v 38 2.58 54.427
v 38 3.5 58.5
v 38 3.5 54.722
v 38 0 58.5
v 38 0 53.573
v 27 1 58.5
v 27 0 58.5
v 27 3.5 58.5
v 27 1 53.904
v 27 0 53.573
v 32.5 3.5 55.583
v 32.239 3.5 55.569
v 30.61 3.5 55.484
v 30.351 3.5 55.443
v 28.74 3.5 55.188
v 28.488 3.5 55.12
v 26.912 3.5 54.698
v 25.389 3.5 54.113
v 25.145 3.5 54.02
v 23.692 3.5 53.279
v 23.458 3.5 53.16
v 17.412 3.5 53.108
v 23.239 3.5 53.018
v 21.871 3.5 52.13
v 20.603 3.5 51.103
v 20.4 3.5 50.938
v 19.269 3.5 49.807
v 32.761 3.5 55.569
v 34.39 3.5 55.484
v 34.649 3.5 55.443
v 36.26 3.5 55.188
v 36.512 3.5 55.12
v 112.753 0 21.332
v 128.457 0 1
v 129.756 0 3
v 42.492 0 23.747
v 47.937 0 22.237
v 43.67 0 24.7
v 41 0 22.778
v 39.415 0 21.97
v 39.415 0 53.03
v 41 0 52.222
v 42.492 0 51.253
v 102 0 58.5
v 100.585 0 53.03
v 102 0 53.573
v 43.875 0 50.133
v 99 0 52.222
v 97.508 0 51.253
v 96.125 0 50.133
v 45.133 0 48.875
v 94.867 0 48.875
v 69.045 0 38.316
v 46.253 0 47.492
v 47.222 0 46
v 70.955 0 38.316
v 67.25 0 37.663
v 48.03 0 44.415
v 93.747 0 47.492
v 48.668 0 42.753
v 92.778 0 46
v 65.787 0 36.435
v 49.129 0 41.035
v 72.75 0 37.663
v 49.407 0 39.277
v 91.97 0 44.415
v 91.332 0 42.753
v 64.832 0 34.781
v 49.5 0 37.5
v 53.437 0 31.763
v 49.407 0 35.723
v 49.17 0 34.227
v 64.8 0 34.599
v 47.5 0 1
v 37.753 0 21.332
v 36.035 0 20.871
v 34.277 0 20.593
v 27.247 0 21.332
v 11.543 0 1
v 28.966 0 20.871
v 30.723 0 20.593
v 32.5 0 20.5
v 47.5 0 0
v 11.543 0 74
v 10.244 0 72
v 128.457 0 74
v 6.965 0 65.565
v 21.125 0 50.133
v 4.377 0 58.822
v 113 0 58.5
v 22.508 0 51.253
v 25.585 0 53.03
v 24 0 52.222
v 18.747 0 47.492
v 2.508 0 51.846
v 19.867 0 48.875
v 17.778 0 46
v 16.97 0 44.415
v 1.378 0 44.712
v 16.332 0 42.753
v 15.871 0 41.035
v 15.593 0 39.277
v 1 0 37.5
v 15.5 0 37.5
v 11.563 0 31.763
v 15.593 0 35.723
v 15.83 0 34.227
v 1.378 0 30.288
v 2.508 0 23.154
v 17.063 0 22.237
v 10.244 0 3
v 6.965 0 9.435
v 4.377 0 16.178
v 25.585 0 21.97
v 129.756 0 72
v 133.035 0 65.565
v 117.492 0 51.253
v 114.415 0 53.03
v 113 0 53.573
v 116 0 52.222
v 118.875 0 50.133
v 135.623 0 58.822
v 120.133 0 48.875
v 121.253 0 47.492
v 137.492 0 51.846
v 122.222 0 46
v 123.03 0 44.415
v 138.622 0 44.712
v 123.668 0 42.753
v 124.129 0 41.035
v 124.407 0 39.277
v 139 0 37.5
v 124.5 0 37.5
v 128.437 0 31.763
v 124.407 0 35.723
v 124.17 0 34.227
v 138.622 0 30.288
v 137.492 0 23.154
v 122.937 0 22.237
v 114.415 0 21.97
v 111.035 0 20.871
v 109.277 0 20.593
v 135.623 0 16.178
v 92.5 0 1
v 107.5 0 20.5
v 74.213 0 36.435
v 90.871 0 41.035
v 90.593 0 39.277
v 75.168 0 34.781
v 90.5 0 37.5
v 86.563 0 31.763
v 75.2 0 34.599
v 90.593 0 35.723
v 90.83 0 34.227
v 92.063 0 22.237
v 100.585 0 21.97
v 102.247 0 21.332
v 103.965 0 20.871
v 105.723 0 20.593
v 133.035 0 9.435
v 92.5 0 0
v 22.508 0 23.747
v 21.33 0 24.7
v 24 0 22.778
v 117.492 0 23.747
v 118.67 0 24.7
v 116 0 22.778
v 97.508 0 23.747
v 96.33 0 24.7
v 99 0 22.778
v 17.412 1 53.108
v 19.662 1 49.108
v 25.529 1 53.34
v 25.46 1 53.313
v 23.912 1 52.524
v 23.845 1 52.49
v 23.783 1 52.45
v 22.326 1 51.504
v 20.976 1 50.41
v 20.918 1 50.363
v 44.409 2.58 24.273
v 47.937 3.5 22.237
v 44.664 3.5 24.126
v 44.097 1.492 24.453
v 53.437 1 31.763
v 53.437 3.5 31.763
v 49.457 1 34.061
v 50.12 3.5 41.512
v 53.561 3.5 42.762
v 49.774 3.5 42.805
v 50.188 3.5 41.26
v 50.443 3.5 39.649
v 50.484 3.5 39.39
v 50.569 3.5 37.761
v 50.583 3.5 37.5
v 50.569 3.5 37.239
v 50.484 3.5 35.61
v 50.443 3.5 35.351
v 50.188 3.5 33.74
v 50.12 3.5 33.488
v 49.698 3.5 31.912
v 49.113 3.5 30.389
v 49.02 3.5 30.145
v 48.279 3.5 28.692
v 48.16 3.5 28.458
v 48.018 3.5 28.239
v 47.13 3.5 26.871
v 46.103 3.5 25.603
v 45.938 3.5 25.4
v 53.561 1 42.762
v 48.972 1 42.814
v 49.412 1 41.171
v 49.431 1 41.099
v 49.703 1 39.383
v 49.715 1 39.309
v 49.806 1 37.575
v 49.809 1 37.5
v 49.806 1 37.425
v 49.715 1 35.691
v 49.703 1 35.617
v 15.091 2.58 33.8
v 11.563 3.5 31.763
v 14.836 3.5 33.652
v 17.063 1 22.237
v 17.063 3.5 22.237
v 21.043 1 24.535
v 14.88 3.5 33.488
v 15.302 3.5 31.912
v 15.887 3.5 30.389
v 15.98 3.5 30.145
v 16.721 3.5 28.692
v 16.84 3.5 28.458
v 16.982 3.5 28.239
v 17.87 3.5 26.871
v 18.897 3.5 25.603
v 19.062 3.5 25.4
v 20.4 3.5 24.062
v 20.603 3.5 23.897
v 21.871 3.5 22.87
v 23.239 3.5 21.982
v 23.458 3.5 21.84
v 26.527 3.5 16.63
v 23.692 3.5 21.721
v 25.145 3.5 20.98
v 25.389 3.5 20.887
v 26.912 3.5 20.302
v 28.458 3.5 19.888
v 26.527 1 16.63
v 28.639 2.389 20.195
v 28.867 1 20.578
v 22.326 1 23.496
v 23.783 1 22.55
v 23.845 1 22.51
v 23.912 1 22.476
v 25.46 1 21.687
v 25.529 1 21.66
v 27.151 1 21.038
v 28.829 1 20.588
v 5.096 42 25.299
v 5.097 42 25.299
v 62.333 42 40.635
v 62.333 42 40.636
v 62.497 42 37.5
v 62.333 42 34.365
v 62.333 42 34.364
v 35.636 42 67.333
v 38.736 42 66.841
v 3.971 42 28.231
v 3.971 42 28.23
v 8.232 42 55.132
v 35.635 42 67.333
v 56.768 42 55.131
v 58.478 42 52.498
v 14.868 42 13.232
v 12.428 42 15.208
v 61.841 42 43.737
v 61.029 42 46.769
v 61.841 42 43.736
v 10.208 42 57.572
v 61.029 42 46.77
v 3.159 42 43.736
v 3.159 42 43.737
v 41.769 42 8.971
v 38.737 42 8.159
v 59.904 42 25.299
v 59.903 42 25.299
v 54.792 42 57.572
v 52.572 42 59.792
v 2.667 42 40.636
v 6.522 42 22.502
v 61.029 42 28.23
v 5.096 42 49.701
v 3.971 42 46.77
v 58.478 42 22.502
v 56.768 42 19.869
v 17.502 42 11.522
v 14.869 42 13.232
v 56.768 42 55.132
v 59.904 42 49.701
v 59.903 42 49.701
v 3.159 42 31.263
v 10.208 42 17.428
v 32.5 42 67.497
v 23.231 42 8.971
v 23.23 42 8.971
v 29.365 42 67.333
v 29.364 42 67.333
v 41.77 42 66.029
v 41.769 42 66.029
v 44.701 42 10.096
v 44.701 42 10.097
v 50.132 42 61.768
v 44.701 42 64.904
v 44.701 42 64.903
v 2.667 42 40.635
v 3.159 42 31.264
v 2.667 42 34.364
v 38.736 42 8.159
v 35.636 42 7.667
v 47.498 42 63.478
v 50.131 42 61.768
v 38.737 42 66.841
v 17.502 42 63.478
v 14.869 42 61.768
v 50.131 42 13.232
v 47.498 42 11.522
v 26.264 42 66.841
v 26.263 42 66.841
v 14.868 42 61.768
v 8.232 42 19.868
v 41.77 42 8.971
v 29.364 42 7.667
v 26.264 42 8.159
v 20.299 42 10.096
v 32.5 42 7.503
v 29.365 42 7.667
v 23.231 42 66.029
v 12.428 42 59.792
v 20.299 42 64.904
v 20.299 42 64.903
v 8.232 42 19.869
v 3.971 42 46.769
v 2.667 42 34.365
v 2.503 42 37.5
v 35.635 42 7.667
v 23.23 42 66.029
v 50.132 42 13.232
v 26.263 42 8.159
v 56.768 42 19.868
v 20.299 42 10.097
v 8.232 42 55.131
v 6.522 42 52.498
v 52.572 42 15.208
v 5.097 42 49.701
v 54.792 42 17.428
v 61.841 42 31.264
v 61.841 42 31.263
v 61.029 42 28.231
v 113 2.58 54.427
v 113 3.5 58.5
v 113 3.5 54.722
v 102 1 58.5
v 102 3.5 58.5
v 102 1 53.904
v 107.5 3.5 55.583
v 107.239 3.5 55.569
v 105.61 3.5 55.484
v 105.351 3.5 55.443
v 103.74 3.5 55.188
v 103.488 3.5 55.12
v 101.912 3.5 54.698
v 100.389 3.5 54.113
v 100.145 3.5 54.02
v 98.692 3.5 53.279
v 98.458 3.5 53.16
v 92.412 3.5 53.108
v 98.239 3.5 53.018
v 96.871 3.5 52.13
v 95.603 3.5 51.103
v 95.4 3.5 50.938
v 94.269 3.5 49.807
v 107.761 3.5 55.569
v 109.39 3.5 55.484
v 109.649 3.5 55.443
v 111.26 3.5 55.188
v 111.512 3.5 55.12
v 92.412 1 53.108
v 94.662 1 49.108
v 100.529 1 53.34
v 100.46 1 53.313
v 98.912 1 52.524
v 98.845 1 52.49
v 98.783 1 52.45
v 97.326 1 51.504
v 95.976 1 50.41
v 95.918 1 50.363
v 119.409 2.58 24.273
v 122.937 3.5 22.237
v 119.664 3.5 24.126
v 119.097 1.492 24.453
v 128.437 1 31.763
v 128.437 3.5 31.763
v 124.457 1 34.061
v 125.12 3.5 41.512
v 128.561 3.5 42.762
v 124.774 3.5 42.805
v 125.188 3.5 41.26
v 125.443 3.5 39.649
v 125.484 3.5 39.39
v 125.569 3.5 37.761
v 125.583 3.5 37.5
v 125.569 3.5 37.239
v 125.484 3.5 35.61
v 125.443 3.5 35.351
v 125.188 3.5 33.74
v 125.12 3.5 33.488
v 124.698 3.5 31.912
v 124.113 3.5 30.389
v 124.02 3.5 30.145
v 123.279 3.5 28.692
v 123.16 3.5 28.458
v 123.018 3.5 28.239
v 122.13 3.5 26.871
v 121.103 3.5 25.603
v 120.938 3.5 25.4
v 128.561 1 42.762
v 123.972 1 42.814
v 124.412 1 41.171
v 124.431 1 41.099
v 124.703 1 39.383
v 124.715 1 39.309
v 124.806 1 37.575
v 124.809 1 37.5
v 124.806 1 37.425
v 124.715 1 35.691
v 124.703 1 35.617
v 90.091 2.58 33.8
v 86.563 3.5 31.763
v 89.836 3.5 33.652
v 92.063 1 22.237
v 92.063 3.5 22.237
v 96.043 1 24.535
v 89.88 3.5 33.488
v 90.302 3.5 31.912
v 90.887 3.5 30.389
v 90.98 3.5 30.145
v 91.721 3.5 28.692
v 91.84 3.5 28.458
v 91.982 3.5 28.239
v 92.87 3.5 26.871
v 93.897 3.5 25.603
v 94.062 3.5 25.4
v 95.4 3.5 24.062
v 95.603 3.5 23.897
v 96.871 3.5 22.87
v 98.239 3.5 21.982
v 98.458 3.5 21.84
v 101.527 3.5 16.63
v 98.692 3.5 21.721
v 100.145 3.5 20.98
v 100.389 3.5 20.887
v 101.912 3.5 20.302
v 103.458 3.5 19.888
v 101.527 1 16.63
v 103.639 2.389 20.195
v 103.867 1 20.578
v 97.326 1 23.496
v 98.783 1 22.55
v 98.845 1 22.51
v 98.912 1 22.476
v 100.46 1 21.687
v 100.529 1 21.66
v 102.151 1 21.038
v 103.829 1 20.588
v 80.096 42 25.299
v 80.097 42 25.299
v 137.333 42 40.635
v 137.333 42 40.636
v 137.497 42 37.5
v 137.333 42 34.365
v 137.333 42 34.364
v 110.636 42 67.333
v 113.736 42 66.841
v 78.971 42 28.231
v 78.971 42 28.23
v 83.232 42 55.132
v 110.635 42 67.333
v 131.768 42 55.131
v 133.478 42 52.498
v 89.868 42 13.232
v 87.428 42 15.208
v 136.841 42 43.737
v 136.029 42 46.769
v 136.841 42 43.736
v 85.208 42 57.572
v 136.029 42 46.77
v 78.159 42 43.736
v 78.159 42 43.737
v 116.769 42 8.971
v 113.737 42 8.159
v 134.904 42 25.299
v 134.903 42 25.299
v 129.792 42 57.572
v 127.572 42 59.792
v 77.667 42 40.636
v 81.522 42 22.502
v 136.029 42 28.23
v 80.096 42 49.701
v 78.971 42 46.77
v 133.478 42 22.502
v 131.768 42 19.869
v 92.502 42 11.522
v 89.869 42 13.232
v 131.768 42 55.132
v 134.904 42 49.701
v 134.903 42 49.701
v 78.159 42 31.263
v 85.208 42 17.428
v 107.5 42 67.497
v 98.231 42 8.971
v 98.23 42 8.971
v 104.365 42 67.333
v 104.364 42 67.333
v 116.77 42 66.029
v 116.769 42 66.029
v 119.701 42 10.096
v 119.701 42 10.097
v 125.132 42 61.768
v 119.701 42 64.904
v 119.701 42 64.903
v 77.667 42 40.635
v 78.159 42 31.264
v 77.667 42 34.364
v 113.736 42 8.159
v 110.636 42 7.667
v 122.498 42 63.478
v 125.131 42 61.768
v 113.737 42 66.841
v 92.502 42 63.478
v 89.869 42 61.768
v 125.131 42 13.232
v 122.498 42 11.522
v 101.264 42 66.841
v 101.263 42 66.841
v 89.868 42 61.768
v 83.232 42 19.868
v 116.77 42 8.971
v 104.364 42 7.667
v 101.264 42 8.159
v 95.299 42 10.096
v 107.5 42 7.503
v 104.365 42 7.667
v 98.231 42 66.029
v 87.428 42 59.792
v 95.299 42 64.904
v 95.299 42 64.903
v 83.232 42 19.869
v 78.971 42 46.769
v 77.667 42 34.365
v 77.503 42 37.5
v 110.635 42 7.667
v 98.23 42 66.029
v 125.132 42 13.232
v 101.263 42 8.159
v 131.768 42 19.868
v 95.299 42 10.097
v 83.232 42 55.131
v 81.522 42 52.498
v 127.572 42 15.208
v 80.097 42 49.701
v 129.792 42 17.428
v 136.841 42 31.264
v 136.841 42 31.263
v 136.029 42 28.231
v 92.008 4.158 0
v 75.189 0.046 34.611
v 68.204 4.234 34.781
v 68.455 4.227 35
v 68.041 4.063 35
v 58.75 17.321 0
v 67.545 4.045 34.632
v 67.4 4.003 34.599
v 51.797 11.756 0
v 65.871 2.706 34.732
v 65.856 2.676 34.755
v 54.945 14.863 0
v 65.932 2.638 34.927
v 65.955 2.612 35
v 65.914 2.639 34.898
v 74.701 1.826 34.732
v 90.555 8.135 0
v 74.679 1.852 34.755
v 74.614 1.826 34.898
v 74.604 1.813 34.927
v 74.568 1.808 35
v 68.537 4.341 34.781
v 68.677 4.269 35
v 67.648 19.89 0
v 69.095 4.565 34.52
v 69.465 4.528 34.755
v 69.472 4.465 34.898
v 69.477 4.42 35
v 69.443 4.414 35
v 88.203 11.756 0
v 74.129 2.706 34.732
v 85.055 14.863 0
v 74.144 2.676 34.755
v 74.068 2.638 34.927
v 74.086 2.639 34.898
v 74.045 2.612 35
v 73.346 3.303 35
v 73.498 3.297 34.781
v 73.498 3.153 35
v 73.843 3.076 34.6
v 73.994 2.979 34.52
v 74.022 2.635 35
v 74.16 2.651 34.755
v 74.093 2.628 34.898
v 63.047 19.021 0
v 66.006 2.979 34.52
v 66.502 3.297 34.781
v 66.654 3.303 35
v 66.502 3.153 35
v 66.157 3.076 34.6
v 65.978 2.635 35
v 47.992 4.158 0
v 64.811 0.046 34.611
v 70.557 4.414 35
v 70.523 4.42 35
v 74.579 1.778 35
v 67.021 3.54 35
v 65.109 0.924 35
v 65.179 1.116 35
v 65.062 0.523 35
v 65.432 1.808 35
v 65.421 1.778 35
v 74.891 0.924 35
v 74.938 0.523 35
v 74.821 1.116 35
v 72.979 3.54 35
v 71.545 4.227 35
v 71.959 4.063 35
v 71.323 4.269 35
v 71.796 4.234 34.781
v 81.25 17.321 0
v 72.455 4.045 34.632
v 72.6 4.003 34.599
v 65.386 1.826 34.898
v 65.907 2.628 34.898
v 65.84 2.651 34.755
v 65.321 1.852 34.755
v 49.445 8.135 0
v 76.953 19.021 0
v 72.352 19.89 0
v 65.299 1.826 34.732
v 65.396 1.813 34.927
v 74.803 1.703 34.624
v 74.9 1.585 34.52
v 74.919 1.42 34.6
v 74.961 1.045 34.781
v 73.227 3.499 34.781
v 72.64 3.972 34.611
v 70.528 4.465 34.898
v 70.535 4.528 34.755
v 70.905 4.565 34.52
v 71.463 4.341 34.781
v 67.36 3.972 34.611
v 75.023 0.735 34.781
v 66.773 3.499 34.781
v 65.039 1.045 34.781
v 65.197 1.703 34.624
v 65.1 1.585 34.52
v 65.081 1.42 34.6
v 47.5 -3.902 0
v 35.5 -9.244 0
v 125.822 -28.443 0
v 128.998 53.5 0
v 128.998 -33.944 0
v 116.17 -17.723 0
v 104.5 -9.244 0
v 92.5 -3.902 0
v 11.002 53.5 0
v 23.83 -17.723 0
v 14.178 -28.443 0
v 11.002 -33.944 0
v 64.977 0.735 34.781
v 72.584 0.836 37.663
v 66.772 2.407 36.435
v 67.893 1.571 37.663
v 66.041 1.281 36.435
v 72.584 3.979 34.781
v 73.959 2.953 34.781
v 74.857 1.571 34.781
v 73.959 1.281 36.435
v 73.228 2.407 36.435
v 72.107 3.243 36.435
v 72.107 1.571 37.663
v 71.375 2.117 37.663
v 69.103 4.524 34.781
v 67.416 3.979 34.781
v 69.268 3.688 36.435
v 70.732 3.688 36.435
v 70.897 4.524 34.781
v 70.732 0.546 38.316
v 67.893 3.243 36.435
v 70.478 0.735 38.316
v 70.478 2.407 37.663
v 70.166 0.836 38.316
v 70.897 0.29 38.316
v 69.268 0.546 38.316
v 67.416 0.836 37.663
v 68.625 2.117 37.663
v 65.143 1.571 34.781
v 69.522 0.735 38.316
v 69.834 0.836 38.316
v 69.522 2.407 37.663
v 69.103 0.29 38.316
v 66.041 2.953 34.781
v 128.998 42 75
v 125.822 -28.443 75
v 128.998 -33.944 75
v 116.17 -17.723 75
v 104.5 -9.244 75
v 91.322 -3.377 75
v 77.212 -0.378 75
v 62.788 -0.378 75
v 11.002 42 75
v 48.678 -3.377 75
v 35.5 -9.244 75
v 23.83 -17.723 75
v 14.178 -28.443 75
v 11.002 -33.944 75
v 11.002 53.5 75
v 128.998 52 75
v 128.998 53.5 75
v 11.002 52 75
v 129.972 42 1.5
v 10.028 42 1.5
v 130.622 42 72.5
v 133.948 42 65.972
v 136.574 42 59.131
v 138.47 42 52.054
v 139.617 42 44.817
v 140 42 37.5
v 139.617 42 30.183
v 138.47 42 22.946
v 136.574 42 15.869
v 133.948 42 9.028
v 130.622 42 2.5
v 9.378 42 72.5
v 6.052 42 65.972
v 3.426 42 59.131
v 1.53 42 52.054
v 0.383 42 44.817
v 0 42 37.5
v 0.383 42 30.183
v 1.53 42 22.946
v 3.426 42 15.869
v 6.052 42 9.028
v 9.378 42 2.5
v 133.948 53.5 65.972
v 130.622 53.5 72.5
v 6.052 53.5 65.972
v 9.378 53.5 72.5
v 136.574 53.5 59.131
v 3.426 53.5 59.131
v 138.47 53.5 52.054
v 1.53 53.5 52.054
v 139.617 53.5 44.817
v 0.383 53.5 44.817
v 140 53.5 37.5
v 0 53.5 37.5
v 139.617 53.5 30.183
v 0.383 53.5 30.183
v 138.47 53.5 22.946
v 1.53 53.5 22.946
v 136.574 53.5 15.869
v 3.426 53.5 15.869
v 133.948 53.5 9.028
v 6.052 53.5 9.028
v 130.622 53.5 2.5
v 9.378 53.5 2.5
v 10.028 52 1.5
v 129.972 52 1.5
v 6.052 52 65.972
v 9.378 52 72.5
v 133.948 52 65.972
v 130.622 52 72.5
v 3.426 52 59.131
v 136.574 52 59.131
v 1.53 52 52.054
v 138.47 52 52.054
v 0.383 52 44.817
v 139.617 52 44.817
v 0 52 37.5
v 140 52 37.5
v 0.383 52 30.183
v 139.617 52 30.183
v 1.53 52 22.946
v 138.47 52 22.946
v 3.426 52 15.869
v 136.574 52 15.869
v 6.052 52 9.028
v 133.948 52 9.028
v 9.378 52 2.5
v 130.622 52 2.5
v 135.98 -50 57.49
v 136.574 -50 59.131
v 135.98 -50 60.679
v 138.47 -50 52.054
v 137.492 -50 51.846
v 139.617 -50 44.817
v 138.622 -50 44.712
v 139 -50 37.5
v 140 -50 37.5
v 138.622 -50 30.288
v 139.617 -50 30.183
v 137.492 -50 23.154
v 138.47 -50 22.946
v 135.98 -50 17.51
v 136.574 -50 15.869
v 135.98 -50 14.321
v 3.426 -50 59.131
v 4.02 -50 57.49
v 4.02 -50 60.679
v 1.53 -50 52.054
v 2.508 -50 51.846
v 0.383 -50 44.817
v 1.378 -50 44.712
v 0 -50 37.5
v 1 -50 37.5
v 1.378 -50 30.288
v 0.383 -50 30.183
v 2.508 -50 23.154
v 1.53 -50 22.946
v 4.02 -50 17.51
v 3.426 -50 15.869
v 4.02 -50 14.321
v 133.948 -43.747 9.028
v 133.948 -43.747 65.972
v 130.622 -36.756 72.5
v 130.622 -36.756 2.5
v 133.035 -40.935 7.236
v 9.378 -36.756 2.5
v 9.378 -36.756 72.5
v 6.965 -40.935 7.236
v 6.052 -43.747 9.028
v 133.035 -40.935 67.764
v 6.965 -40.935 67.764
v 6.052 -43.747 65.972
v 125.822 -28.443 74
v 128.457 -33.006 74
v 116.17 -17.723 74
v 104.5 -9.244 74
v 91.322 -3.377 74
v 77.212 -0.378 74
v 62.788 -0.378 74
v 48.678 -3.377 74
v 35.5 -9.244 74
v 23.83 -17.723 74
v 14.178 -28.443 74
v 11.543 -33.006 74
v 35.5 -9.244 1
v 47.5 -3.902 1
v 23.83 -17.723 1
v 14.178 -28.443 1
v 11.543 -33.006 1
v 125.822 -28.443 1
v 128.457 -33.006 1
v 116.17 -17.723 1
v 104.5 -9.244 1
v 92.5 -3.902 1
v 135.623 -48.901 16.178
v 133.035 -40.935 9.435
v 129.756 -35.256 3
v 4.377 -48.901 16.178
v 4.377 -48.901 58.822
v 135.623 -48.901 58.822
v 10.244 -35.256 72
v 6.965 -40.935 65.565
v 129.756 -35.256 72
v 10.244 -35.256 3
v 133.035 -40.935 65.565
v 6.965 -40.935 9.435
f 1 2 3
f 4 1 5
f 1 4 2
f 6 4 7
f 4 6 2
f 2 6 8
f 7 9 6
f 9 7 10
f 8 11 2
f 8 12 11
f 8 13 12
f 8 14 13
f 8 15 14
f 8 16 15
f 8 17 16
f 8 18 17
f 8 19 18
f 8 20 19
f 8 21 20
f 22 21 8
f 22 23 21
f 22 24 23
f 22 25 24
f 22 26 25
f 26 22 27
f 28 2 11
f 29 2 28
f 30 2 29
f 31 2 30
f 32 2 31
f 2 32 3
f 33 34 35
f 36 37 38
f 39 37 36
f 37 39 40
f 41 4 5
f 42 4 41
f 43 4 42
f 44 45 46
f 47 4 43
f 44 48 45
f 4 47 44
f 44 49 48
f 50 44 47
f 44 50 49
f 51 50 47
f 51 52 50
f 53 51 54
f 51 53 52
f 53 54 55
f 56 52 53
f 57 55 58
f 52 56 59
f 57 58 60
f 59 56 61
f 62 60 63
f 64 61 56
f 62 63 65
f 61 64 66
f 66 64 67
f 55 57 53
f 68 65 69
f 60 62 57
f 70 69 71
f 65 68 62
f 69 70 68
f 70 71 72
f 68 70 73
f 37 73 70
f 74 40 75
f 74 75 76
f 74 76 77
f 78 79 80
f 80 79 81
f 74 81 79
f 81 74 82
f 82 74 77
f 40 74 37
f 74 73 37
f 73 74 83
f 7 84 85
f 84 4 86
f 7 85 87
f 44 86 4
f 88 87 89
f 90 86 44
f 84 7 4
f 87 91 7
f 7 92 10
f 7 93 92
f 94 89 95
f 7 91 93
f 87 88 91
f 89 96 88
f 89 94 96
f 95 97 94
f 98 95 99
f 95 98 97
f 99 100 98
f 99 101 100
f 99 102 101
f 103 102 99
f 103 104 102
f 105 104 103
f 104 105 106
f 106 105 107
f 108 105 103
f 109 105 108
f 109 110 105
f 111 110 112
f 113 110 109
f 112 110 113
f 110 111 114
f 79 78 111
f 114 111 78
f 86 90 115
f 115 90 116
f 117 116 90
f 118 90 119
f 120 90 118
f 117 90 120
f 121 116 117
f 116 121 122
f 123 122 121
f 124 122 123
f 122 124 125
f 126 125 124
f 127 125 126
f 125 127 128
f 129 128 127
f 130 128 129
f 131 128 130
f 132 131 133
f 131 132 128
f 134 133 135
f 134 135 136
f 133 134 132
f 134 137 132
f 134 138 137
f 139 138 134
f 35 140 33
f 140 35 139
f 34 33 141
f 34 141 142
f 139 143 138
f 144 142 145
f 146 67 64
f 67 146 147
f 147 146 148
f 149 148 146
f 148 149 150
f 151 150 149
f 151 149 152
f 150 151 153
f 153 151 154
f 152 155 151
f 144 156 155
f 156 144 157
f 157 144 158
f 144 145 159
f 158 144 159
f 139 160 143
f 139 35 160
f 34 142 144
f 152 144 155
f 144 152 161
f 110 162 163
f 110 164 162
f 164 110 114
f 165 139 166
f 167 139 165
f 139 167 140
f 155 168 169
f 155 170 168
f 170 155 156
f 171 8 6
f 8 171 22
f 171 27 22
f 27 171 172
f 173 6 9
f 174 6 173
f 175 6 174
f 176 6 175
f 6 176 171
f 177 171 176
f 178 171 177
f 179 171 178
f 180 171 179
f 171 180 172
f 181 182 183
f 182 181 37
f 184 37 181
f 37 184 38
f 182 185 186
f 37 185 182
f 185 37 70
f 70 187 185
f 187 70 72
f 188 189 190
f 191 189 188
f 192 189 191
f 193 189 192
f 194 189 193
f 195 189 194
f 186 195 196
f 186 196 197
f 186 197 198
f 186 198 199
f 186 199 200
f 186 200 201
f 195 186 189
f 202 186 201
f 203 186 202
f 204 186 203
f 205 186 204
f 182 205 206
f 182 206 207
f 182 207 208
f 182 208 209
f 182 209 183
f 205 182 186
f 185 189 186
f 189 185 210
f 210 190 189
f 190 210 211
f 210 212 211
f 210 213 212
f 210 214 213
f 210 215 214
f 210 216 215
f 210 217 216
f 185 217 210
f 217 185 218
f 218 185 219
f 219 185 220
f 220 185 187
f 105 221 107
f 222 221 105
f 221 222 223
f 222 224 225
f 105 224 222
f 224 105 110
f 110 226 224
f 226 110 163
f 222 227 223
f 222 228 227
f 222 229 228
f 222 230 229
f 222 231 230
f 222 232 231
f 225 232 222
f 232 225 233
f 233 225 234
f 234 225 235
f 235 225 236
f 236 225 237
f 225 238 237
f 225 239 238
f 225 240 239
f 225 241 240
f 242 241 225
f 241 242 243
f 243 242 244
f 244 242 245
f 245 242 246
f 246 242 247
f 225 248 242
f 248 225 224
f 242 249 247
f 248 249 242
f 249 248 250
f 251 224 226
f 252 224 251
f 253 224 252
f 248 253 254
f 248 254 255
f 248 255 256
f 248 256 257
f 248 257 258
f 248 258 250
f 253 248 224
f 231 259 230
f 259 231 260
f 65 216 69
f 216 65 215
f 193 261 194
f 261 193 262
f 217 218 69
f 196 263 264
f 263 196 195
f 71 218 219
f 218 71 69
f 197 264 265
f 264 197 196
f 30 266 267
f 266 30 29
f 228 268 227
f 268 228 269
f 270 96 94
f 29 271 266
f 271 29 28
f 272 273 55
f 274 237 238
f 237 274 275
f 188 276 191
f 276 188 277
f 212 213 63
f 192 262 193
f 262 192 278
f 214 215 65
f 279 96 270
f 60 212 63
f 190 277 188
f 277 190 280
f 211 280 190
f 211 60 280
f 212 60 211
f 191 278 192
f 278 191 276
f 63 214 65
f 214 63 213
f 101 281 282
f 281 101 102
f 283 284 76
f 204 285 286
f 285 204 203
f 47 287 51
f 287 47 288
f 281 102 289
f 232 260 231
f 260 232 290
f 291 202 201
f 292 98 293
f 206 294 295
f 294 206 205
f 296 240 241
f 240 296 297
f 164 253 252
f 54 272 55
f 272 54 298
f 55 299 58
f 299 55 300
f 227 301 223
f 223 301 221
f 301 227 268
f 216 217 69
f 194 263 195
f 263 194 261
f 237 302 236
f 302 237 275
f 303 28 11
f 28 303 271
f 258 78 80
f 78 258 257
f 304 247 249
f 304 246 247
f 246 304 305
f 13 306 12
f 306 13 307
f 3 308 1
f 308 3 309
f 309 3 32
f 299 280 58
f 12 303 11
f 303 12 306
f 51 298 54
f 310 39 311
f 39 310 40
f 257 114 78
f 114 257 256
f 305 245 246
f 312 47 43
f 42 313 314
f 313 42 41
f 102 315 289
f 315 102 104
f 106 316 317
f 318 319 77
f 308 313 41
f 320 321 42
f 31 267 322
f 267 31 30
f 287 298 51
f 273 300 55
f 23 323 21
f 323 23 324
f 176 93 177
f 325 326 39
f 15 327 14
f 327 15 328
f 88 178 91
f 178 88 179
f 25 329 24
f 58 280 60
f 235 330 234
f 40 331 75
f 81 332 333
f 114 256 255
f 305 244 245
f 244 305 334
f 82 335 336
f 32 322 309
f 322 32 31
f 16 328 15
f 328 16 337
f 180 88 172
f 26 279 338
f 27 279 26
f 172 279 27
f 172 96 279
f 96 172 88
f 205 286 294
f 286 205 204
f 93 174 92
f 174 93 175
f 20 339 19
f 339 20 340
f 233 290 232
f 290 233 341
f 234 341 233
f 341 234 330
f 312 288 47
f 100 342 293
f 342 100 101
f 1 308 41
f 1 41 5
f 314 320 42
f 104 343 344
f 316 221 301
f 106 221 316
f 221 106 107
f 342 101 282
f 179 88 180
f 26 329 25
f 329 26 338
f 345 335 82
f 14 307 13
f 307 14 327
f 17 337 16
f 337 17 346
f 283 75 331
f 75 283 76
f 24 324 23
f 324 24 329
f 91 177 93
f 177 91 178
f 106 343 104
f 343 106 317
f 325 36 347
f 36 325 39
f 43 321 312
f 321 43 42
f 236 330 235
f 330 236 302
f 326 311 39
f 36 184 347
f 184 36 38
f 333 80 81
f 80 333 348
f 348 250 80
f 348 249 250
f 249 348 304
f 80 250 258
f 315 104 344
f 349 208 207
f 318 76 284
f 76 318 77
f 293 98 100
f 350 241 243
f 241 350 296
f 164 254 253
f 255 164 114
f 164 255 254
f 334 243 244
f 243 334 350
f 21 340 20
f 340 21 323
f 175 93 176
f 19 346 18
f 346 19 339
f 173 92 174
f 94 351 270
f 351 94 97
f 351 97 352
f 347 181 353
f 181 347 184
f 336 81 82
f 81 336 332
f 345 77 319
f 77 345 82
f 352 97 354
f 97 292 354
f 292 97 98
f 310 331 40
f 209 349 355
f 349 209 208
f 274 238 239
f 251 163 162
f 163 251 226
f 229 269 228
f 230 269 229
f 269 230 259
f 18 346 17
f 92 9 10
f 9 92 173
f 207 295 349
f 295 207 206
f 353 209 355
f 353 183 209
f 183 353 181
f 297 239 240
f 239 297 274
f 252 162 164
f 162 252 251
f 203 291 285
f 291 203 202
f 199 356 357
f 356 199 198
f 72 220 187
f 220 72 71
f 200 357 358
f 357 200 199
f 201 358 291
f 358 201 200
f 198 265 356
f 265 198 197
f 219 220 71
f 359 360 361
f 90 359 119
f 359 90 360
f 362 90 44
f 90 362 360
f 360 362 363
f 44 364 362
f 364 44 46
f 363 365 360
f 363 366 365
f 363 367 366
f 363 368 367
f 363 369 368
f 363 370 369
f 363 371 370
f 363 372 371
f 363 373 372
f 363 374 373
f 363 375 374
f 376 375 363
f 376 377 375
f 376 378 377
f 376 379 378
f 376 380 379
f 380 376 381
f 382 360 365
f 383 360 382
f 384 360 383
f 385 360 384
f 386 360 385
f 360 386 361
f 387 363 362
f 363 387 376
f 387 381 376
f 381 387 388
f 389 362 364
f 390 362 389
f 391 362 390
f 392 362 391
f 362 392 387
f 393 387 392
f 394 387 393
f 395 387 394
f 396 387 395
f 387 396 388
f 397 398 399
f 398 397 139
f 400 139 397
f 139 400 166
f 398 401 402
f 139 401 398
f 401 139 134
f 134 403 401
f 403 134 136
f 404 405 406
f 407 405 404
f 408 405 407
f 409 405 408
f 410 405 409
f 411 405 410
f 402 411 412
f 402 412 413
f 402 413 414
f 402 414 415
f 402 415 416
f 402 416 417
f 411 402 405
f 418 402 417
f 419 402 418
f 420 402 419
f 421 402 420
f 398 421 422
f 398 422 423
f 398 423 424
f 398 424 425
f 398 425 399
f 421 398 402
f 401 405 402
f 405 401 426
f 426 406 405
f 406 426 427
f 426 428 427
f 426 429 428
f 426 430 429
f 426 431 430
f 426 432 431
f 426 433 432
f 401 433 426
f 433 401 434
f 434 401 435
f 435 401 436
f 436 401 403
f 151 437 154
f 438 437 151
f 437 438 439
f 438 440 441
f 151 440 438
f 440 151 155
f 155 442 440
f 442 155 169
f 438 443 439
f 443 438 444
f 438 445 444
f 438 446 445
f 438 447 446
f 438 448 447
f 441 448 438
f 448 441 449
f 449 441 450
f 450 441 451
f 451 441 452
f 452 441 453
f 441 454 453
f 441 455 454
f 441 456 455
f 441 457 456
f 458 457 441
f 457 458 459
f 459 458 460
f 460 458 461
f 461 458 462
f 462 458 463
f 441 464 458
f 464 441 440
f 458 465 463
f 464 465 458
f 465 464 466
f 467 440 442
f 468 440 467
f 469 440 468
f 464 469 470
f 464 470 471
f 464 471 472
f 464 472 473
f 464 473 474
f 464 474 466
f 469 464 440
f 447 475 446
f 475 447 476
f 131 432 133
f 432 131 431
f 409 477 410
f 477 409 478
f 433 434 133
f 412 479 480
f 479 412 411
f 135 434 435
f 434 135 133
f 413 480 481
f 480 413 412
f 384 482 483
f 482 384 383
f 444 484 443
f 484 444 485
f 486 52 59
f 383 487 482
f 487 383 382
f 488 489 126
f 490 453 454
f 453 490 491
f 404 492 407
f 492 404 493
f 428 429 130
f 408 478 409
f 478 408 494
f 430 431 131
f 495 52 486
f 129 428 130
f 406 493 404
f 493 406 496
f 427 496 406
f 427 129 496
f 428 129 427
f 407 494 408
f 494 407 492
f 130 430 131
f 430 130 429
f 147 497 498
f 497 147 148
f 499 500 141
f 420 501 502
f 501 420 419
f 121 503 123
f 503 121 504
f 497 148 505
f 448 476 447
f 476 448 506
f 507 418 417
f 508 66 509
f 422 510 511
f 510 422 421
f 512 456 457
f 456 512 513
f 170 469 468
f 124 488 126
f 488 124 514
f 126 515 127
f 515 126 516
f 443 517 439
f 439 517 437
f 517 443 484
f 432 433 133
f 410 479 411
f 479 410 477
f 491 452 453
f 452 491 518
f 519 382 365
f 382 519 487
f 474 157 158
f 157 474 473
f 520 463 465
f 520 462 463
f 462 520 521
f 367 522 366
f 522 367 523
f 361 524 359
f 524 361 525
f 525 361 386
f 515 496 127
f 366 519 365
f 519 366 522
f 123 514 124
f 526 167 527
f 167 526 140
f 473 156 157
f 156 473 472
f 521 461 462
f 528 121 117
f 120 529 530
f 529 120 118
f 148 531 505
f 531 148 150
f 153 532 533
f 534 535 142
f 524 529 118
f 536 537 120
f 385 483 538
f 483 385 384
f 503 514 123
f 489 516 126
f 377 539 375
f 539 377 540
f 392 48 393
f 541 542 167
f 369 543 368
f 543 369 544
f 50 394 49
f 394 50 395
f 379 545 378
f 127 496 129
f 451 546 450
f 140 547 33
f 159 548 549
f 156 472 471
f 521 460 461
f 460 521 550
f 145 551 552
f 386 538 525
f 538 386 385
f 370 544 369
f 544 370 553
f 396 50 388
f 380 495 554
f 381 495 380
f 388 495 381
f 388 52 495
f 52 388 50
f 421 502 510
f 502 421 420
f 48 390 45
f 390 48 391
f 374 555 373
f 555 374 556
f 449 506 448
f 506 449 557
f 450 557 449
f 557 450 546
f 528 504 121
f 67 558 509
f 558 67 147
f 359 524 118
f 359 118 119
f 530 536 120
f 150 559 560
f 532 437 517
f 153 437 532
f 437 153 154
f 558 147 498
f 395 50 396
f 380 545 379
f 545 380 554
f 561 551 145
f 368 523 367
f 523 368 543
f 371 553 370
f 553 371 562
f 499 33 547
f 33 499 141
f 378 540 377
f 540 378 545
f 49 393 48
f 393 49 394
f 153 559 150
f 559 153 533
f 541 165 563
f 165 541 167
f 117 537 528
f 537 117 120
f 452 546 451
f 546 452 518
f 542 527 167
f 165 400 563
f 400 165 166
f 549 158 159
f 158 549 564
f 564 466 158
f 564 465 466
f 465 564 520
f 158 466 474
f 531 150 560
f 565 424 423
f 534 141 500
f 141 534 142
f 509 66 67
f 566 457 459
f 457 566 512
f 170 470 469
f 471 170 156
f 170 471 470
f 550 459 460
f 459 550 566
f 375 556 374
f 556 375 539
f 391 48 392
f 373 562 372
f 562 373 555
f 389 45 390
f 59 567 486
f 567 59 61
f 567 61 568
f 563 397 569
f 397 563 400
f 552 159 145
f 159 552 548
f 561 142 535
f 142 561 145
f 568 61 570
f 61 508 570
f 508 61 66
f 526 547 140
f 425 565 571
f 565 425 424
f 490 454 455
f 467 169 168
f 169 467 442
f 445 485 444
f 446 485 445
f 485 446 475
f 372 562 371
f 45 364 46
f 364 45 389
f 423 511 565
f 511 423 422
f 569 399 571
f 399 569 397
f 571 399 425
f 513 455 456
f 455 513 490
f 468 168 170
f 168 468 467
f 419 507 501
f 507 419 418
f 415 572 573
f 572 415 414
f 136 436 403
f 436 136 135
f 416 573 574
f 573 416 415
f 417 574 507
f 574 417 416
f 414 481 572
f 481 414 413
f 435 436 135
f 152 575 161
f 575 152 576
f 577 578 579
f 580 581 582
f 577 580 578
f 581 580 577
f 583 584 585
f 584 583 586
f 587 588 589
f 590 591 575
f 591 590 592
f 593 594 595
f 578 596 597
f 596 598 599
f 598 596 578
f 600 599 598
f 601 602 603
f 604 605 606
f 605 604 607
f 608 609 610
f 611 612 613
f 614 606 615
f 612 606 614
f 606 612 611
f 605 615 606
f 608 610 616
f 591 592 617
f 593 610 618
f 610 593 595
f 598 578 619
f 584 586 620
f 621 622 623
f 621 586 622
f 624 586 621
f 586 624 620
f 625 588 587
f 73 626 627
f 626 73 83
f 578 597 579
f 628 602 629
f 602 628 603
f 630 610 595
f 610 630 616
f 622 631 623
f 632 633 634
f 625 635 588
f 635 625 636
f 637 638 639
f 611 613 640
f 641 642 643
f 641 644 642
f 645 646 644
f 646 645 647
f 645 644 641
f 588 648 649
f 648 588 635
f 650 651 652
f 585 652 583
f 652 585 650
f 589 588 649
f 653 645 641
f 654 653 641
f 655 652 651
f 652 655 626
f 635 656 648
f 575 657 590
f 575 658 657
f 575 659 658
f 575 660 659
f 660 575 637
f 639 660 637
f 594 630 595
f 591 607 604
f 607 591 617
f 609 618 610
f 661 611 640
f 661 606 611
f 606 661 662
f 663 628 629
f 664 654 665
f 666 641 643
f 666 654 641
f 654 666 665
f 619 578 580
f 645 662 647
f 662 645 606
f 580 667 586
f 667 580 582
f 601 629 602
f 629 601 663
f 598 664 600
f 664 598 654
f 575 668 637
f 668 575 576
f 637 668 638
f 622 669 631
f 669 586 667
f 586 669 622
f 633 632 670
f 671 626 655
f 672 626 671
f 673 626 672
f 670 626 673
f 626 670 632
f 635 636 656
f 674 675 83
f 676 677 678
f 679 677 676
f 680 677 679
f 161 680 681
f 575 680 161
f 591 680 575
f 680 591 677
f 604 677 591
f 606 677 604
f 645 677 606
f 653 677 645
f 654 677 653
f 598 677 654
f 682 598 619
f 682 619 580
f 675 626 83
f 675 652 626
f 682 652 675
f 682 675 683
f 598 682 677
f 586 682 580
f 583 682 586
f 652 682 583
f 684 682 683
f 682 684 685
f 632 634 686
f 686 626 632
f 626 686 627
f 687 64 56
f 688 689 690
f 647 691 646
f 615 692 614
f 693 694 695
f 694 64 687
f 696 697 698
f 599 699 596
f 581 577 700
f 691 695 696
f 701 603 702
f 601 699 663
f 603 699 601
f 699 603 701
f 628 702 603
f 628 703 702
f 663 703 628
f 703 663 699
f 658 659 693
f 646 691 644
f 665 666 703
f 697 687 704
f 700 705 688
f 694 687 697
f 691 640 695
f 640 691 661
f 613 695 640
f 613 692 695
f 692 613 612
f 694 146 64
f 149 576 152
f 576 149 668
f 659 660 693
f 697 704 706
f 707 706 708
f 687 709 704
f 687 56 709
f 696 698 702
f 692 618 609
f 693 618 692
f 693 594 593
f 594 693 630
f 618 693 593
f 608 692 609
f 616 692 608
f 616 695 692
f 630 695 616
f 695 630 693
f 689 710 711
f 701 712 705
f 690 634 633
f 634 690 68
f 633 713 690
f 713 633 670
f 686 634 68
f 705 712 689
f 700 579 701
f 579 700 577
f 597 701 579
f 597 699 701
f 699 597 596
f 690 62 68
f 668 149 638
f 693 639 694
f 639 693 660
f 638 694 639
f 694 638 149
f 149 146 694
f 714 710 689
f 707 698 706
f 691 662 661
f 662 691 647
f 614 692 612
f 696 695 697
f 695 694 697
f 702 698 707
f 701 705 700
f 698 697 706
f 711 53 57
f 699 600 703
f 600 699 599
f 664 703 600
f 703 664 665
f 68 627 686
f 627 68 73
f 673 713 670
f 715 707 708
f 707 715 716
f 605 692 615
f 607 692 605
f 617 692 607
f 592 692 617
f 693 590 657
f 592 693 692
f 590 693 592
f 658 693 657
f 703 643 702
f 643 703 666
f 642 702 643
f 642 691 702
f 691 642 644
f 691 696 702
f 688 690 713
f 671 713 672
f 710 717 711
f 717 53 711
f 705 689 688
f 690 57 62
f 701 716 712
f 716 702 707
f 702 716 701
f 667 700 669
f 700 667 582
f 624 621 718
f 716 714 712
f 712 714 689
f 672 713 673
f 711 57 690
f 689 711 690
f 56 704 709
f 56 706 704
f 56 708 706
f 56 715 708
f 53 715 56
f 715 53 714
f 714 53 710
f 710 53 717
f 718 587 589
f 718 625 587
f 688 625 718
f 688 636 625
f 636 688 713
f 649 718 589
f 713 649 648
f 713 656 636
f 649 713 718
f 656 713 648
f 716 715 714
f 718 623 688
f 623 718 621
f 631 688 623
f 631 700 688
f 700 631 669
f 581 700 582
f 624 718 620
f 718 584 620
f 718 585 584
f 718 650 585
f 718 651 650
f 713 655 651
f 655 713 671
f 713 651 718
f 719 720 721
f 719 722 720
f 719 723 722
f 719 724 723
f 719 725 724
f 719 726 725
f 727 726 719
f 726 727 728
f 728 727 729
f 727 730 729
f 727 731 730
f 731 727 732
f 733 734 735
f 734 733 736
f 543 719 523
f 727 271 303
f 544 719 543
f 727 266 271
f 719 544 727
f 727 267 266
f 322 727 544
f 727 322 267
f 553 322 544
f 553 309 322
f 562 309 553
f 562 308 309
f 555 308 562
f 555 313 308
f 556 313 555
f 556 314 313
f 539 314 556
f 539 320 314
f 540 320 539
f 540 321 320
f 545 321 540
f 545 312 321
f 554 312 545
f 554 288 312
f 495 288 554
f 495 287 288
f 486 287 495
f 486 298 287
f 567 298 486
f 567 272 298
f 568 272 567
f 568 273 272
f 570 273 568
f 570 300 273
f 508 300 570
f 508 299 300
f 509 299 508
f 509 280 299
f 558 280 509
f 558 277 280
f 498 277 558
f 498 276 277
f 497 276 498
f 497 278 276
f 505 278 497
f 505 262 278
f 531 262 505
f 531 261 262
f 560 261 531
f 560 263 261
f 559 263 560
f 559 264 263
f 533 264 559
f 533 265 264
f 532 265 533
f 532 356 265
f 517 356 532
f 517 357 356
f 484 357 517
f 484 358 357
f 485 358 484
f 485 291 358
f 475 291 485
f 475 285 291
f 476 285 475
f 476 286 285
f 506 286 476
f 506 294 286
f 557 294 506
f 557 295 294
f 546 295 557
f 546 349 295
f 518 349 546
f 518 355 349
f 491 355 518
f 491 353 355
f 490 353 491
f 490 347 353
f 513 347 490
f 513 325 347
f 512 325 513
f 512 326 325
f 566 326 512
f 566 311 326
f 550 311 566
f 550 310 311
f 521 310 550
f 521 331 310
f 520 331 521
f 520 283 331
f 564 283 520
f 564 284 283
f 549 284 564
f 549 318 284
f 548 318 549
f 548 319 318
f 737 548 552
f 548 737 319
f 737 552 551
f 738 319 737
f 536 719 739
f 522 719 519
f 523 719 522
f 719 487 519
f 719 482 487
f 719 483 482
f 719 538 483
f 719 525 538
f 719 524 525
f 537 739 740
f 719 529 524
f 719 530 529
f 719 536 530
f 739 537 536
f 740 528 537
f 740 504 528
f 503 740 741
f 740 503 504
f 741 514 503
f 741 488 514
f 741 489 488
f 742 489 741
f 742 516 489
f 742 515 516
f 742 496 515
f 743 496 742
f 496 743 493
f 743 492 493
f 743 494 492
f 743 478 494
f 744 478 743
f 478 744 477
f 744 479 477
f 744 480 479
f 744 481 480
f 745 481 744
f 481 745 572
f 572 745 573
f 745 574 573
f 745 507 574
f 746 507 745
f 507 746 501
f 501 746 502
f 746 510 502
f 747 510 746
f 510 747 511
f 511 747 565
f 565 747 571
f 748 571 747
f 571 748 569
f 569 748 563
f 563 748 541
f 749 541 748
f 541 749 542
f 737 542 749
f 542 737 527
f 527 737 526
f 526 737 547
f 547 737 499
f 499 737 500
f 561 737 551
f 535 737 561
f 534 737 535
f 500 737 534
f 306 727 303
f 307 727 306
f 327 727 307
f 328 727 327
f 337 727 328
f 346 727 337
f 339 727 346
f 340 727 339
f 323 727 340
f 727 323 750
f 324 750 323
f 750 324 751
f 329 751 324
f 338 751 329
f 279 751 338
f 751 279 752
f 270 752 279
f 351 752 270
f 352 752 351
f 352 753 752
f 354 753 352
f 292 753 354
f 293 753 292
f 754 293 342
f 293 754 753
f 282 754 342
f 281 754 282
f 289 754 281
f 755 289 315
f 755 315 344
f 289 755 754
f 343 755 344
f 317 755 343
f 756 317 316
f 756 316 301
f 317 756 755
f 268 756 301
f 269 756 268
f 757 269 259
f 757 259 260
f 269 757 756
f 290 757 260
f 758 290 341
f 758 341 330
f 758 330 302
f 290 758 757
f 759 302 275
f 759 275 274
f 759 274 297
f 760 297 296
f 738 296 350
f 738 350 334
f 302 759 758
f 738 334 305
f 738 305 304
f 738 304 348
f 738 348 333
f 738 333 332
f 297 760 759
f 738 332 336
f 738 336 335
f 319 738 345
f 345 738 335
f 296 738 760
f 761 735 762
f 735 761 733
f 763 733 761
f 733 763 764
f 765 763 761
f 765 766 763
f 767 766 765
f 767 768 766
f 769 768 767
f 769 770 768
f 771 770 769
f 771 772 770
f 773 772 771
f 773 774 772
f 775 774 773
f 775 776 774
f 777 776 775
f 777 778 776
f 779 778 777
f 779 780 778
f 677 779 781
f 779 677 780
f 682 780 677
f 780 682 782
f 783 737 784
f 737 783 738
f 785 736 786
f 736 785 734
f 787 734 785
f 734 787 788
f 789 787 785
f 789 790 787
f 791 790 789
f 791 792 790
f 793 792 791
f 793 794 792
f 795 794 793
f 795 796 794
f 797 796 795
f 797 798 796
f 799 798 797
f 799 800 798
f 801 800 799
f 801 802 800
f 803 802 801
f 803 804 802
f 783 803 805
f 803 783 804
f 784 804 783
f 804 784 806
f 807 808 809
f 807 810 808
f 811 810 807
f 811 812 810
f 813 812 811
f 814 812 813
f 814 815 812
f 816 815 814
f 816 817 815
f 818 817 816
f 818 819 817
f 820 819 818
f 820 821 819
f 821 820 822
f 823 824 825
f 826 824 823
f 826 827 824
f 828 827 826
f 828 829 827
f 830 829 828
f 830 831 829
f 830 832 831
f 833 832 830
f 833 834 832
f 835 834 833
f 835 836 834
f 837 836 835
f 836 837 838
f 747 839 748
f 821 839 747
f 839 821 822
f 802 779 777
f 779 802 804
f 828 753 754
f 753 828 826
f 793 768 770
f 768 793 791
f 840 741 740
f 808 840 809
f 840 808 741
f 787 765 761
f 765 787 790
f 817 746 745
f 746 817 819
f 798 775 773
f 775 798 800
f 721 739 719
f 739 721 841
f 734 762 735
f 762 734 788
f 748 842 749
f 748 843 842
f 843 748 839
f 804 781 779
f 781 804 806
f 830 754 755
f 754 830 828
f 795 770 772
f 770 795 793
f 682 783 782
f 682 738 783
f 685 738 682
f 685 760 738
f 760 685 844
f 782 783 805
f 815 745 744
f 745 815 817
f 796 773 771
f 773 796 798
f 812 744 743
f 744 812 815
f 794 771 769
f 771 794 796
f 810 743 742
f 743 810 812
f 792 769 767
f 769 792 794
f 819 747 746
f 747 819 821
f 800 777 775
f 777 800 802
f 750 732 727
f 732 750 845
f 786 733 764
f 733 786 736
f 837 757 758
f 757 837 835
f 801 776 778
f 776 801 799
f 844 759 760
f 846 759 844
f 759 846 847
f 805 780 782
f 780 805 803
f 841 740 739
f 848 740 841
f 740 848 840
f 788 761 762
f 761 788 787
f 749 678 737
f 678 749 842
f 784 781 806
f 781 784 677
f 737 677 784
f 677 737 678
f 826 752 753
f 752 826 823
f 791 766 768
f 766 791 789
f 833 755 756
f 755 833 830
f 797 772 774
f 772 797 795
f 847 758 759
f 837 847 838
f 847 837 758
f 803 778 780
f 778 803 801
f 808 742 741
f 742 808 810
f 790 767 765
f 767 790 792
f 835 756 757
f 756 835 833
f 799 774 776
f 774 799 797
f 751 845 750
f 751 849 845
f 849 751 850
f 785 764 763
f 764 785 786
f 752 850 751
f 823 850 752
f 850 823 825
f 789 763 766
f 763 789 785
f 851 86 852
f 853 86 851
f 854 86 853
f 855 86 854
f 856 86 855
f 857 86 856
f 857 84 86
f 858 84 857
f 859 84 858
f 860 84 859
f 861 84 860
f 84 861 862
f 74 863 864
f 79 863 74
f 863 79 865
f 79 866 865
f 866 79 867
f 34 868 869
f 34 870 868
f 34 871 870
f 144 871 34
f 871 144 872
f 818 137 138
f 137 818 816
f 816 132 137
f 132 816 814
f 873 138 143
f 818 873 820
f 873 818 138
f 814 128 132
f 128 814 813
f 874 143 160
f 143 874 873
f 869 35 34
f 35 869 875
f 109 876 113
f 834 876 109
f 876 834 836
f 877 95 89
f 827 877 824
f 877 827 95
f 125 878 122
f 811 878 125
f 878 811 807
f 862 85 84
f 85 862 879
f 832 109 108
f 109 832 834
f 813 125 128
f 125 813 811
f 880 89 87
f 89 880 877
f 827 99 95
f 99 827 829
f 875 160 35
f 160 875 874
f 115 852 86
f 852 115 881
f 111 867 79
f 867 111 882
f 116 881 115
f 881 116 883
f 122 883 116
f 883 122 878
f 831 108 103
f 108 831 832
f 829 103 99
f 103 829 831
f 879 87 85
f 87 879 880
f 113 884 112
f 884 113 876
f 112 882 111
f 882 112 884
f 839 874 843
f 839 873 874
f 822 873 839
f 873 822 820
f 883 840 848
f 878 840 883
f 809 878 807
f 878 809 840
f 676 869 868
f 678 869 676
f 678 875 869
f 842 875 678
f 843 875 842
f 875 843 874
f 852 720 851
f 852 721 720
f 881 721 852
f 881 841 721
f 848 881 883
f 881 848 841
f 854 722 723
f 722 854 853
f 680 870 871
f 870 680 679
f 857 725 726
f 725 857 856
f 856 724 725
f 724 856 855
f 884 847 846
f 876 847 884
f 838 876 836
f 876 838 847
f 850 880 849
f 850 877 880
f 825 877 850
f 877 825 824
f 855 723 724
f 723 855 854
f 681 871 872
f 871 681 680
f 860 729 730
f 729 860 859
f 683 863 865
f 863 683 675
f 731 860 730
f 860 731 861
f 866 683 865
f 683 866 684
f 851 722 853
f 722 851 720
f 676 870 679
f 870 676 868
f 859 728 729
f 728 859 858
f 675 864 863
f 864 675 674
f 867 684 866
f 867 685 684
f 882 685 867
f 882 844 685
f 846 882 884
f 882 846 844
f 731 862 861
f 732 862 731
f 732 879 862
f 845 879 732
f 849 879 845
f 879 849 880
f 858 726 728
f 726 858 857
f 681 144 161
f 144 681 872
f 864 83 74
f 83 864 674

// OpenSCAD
/****************************************
 * Generate VR Headset for Mobile Phone *
 ****************************************/

// TODO: Add mechanism to press against the phone screen for the primary trigger.
// TODO: Lens flange slots don't actually allow the lenses to rotate into them.

/*******************************
 *   Adjustable Measurements   *
 *                             *
 * All measurements are in mm. *
 *******************************/

// Overall case size
// Width, Depth, Height
CaseSize = [140, 42, 75];

// Interpupillary Distance
IPD = 75;

// Diameter of the lenses at the eyes
LensDiameter = 34;

// Diameter of the area of the screen 
// that will be viewed
ViewDiameterAtPhone = 60;

// Width, Thickness, and Height of the 
// protrusions on the lens that latch onto the frame.
LensFlangeDimensions = [11, 2.5, 4];

// Distance the lens is inset into the frame
LensFlangeInset = 1;

// Number of flanges around the edges of the lens
NumberOfLensFlanges = 3;

// Phone measurements
// Height, Thickness, Width
Phone = [140, 10, 75]; 

// Thickness of the border that holds in the phone.
PhoneHolderThickness = 1.5;

// Nose Opening measurements
// Width, depth, height
NoseOpening = [45, 40, 40]; 

// Face Guard measurements
FaceGuardDepth = 50;
FaceGuardThickness = 1;

///////////////////////////
// Internal Measurements //
//     DO NOT CHANGE     //
///////////////////////////

// Derived lens measurements
HalfIPD = IPD / 2;
LensRadius = LensDiameter / 2;

// Distance from the bottom of the case 
// that indicates where the center of the lenses should be.
LensVerticalDistance = Phone.z / 2;

CenterLeftLens = [
    CaseSize.x / 2 - HalfIPD, 
    LensVerticalDistance];
CenterRightLens = [
    CaseSize.x / 2 + HalfIPD, 
    LensVerticalDistance];
   
LensFlangeOpeningDimensions = [
    LensFlangeDimensions.x,
    LensFlangeDimensions.y + LensFlangeInset,
    LensFlangeDimensions.z
];
    
// Derived nose opening measurements
NoseOpeningRatio = NoseOpening.y/NoseOpening.x;

// Derived phone holder measurements
PhoneHolder = [
    CaseSize.x, 
    Phone.y + PhoneHolderThickness, 
    CaseSize.z];
PhoneHolderInterior = [
    Phone.x, 
    Phone.y, 
    PhoneHolder.z - PhoneHolderThickness];
PhoneWidthOffset = (CaseSize.x - Phone.x) / 2;

// Derived face guard measurements
FaceGuard = [CaseSize.x, FaceGuardDepth, CaseSize.z];
FaceGuardInterior = [
    CaseSize.x - FaceGuardThickness * 2, 
    FaceGuardDepth + 2, 
    CaseSize.z - FaceGuardThickness * 2];
FaceGuardArcRadius = FaceGuardInterior.x / 2;

// Total size of the headset
TotalSize = [
    CaseSize.x,
    CaseSize.y + PhoneHolder.y + FaceGuard.y,
    CaseSize.z
];

// Dump key measurements to console for generating Cardboard profile
echo("Key Measurements for Cardboard Profile:");
echo(ScreenToLensDistance=CaseSize.y - 2);
echo(InterLensDistance=IPD); 
echo(TrayToLensCenterDistance=LensVerticalDistance);

// Modules
module flattenedTube(size) {
    intersection() {
        cube(size);
        rotate ([-90, 0, 0]) {
            translate([size.x / 2, -size.z / 2, 0]) {
                cylinder(h=size.y, d=size.x, $fa=6);
            }
        }
    }
}

module lens() {
    rotate ([-90, 0, 0]) {
        cylinder(h=CaseSize.y+0.01, 
                 d1=LensDiameter, 
                 d2=ViewDiameterAtPhone,
                 $fa=6);
    }

    for (i = [0:360/NumberOfLensFlanges:360]) {
        rotate([0, i, 0]) {
            // Flange opening
            translate([-(LensFlangeOpeningDimensions.x / 2), 0, LensRadius - LensFlangeOpeningDimensions.z]) {
                cube([
                    LensFlangeOpeningDimensions.x,
                    LensFlangeOpeningDimensions.y,
                    LensFlangeOpeningDimensions.z * 2]);
            }
            // Flange slot
            slotRotation = atan((LensFlangeDimensions.x / 2) / (LensRadius + LensFlangeDimensions.z)) * 2;
            rotate([0, -slotRotation, 0]) {
                translate([-(LensFlangeDimensions.x / 2), LensFlangeInset, (LensRadius) - LensFlangeOpeningDimensions.z]) {
                
                    cube([
                        LensFlangeDimensions.x,
                        LensFlangeDimensions.y,
                        LensFlangeDimensions.z * 2]);
                }
            }
        }
    }
}

module noseHole() {
    scale([1, NoseOpeningRatio, 1]) {
         union() {
            cylinder(h=NoseOpening.z - 5, 
                     d1=NoseOpening.x, 
                     d2=10);
        }
        translate([0, 0, NoseOpening.z - 7.1]) {
            sphere(d=11);
        }
    }
}

module phoneHolder() {
    difference() {
        cube(PhoneHolder);
        translate([PhoneWidthOffset, 0, PhoneHolderThickness]) {
            cube(PhoneHolderInterior);
        }
    }
}

module faceGuard() {
    difference() {
        flattenedTube(FaceGuard);
        // Hollow out the inside of the face guard
        translate([FaceGuardThickness, -1, FaceGuardThickness]) {
            flattenedTube(FaceGuardInterior);
        }
        // Arc at the top and bottom
        translate([FaceGuardArcRadius + FaceGuardThickness, -FaceGuardArcRadius + FaceGuard.y, 0]) {
            cylinder(h=FaceGuard.z, r=FaceGuardArcRadius);
        }
        // Nose Opening Cutout
        translate([(FaceGuard.x / 2) - (NoseOpening.x / 2), 0, 0]) {
            cube([NoseOpening.x, FaceGuard.y, FaceGuardThickness]);
        }
    }
}

// Case
intersection() {
    union() {
        // Lens Holder
        difference() {
            cube(CaseSize);

            // Left Lens
            translate([CenterLeftLens.x, 0, CenterLeftLens.y]) {
                lens();
            }
            
            // Right Lens
            translate([CenterRightLens.x, 0, CenterRightLens.y]) {
                lens();
            }
            
            // Nose hole
            translate([CaseSize.x / 2, 0, 0]) {
                noseHole();
            }
        }

        // Phone Holder
        translate([0, CaseSize.y, 0]) {
            phoneHolder();
        }
        
        // Face Guard
        translate([0, -FaceGuard.y, 0]) {
            faceGuard();
        }
    }
    translate([0, -FaceGuard.y, 0]) {
        flattenedTube(TotalSize);
    }
}
